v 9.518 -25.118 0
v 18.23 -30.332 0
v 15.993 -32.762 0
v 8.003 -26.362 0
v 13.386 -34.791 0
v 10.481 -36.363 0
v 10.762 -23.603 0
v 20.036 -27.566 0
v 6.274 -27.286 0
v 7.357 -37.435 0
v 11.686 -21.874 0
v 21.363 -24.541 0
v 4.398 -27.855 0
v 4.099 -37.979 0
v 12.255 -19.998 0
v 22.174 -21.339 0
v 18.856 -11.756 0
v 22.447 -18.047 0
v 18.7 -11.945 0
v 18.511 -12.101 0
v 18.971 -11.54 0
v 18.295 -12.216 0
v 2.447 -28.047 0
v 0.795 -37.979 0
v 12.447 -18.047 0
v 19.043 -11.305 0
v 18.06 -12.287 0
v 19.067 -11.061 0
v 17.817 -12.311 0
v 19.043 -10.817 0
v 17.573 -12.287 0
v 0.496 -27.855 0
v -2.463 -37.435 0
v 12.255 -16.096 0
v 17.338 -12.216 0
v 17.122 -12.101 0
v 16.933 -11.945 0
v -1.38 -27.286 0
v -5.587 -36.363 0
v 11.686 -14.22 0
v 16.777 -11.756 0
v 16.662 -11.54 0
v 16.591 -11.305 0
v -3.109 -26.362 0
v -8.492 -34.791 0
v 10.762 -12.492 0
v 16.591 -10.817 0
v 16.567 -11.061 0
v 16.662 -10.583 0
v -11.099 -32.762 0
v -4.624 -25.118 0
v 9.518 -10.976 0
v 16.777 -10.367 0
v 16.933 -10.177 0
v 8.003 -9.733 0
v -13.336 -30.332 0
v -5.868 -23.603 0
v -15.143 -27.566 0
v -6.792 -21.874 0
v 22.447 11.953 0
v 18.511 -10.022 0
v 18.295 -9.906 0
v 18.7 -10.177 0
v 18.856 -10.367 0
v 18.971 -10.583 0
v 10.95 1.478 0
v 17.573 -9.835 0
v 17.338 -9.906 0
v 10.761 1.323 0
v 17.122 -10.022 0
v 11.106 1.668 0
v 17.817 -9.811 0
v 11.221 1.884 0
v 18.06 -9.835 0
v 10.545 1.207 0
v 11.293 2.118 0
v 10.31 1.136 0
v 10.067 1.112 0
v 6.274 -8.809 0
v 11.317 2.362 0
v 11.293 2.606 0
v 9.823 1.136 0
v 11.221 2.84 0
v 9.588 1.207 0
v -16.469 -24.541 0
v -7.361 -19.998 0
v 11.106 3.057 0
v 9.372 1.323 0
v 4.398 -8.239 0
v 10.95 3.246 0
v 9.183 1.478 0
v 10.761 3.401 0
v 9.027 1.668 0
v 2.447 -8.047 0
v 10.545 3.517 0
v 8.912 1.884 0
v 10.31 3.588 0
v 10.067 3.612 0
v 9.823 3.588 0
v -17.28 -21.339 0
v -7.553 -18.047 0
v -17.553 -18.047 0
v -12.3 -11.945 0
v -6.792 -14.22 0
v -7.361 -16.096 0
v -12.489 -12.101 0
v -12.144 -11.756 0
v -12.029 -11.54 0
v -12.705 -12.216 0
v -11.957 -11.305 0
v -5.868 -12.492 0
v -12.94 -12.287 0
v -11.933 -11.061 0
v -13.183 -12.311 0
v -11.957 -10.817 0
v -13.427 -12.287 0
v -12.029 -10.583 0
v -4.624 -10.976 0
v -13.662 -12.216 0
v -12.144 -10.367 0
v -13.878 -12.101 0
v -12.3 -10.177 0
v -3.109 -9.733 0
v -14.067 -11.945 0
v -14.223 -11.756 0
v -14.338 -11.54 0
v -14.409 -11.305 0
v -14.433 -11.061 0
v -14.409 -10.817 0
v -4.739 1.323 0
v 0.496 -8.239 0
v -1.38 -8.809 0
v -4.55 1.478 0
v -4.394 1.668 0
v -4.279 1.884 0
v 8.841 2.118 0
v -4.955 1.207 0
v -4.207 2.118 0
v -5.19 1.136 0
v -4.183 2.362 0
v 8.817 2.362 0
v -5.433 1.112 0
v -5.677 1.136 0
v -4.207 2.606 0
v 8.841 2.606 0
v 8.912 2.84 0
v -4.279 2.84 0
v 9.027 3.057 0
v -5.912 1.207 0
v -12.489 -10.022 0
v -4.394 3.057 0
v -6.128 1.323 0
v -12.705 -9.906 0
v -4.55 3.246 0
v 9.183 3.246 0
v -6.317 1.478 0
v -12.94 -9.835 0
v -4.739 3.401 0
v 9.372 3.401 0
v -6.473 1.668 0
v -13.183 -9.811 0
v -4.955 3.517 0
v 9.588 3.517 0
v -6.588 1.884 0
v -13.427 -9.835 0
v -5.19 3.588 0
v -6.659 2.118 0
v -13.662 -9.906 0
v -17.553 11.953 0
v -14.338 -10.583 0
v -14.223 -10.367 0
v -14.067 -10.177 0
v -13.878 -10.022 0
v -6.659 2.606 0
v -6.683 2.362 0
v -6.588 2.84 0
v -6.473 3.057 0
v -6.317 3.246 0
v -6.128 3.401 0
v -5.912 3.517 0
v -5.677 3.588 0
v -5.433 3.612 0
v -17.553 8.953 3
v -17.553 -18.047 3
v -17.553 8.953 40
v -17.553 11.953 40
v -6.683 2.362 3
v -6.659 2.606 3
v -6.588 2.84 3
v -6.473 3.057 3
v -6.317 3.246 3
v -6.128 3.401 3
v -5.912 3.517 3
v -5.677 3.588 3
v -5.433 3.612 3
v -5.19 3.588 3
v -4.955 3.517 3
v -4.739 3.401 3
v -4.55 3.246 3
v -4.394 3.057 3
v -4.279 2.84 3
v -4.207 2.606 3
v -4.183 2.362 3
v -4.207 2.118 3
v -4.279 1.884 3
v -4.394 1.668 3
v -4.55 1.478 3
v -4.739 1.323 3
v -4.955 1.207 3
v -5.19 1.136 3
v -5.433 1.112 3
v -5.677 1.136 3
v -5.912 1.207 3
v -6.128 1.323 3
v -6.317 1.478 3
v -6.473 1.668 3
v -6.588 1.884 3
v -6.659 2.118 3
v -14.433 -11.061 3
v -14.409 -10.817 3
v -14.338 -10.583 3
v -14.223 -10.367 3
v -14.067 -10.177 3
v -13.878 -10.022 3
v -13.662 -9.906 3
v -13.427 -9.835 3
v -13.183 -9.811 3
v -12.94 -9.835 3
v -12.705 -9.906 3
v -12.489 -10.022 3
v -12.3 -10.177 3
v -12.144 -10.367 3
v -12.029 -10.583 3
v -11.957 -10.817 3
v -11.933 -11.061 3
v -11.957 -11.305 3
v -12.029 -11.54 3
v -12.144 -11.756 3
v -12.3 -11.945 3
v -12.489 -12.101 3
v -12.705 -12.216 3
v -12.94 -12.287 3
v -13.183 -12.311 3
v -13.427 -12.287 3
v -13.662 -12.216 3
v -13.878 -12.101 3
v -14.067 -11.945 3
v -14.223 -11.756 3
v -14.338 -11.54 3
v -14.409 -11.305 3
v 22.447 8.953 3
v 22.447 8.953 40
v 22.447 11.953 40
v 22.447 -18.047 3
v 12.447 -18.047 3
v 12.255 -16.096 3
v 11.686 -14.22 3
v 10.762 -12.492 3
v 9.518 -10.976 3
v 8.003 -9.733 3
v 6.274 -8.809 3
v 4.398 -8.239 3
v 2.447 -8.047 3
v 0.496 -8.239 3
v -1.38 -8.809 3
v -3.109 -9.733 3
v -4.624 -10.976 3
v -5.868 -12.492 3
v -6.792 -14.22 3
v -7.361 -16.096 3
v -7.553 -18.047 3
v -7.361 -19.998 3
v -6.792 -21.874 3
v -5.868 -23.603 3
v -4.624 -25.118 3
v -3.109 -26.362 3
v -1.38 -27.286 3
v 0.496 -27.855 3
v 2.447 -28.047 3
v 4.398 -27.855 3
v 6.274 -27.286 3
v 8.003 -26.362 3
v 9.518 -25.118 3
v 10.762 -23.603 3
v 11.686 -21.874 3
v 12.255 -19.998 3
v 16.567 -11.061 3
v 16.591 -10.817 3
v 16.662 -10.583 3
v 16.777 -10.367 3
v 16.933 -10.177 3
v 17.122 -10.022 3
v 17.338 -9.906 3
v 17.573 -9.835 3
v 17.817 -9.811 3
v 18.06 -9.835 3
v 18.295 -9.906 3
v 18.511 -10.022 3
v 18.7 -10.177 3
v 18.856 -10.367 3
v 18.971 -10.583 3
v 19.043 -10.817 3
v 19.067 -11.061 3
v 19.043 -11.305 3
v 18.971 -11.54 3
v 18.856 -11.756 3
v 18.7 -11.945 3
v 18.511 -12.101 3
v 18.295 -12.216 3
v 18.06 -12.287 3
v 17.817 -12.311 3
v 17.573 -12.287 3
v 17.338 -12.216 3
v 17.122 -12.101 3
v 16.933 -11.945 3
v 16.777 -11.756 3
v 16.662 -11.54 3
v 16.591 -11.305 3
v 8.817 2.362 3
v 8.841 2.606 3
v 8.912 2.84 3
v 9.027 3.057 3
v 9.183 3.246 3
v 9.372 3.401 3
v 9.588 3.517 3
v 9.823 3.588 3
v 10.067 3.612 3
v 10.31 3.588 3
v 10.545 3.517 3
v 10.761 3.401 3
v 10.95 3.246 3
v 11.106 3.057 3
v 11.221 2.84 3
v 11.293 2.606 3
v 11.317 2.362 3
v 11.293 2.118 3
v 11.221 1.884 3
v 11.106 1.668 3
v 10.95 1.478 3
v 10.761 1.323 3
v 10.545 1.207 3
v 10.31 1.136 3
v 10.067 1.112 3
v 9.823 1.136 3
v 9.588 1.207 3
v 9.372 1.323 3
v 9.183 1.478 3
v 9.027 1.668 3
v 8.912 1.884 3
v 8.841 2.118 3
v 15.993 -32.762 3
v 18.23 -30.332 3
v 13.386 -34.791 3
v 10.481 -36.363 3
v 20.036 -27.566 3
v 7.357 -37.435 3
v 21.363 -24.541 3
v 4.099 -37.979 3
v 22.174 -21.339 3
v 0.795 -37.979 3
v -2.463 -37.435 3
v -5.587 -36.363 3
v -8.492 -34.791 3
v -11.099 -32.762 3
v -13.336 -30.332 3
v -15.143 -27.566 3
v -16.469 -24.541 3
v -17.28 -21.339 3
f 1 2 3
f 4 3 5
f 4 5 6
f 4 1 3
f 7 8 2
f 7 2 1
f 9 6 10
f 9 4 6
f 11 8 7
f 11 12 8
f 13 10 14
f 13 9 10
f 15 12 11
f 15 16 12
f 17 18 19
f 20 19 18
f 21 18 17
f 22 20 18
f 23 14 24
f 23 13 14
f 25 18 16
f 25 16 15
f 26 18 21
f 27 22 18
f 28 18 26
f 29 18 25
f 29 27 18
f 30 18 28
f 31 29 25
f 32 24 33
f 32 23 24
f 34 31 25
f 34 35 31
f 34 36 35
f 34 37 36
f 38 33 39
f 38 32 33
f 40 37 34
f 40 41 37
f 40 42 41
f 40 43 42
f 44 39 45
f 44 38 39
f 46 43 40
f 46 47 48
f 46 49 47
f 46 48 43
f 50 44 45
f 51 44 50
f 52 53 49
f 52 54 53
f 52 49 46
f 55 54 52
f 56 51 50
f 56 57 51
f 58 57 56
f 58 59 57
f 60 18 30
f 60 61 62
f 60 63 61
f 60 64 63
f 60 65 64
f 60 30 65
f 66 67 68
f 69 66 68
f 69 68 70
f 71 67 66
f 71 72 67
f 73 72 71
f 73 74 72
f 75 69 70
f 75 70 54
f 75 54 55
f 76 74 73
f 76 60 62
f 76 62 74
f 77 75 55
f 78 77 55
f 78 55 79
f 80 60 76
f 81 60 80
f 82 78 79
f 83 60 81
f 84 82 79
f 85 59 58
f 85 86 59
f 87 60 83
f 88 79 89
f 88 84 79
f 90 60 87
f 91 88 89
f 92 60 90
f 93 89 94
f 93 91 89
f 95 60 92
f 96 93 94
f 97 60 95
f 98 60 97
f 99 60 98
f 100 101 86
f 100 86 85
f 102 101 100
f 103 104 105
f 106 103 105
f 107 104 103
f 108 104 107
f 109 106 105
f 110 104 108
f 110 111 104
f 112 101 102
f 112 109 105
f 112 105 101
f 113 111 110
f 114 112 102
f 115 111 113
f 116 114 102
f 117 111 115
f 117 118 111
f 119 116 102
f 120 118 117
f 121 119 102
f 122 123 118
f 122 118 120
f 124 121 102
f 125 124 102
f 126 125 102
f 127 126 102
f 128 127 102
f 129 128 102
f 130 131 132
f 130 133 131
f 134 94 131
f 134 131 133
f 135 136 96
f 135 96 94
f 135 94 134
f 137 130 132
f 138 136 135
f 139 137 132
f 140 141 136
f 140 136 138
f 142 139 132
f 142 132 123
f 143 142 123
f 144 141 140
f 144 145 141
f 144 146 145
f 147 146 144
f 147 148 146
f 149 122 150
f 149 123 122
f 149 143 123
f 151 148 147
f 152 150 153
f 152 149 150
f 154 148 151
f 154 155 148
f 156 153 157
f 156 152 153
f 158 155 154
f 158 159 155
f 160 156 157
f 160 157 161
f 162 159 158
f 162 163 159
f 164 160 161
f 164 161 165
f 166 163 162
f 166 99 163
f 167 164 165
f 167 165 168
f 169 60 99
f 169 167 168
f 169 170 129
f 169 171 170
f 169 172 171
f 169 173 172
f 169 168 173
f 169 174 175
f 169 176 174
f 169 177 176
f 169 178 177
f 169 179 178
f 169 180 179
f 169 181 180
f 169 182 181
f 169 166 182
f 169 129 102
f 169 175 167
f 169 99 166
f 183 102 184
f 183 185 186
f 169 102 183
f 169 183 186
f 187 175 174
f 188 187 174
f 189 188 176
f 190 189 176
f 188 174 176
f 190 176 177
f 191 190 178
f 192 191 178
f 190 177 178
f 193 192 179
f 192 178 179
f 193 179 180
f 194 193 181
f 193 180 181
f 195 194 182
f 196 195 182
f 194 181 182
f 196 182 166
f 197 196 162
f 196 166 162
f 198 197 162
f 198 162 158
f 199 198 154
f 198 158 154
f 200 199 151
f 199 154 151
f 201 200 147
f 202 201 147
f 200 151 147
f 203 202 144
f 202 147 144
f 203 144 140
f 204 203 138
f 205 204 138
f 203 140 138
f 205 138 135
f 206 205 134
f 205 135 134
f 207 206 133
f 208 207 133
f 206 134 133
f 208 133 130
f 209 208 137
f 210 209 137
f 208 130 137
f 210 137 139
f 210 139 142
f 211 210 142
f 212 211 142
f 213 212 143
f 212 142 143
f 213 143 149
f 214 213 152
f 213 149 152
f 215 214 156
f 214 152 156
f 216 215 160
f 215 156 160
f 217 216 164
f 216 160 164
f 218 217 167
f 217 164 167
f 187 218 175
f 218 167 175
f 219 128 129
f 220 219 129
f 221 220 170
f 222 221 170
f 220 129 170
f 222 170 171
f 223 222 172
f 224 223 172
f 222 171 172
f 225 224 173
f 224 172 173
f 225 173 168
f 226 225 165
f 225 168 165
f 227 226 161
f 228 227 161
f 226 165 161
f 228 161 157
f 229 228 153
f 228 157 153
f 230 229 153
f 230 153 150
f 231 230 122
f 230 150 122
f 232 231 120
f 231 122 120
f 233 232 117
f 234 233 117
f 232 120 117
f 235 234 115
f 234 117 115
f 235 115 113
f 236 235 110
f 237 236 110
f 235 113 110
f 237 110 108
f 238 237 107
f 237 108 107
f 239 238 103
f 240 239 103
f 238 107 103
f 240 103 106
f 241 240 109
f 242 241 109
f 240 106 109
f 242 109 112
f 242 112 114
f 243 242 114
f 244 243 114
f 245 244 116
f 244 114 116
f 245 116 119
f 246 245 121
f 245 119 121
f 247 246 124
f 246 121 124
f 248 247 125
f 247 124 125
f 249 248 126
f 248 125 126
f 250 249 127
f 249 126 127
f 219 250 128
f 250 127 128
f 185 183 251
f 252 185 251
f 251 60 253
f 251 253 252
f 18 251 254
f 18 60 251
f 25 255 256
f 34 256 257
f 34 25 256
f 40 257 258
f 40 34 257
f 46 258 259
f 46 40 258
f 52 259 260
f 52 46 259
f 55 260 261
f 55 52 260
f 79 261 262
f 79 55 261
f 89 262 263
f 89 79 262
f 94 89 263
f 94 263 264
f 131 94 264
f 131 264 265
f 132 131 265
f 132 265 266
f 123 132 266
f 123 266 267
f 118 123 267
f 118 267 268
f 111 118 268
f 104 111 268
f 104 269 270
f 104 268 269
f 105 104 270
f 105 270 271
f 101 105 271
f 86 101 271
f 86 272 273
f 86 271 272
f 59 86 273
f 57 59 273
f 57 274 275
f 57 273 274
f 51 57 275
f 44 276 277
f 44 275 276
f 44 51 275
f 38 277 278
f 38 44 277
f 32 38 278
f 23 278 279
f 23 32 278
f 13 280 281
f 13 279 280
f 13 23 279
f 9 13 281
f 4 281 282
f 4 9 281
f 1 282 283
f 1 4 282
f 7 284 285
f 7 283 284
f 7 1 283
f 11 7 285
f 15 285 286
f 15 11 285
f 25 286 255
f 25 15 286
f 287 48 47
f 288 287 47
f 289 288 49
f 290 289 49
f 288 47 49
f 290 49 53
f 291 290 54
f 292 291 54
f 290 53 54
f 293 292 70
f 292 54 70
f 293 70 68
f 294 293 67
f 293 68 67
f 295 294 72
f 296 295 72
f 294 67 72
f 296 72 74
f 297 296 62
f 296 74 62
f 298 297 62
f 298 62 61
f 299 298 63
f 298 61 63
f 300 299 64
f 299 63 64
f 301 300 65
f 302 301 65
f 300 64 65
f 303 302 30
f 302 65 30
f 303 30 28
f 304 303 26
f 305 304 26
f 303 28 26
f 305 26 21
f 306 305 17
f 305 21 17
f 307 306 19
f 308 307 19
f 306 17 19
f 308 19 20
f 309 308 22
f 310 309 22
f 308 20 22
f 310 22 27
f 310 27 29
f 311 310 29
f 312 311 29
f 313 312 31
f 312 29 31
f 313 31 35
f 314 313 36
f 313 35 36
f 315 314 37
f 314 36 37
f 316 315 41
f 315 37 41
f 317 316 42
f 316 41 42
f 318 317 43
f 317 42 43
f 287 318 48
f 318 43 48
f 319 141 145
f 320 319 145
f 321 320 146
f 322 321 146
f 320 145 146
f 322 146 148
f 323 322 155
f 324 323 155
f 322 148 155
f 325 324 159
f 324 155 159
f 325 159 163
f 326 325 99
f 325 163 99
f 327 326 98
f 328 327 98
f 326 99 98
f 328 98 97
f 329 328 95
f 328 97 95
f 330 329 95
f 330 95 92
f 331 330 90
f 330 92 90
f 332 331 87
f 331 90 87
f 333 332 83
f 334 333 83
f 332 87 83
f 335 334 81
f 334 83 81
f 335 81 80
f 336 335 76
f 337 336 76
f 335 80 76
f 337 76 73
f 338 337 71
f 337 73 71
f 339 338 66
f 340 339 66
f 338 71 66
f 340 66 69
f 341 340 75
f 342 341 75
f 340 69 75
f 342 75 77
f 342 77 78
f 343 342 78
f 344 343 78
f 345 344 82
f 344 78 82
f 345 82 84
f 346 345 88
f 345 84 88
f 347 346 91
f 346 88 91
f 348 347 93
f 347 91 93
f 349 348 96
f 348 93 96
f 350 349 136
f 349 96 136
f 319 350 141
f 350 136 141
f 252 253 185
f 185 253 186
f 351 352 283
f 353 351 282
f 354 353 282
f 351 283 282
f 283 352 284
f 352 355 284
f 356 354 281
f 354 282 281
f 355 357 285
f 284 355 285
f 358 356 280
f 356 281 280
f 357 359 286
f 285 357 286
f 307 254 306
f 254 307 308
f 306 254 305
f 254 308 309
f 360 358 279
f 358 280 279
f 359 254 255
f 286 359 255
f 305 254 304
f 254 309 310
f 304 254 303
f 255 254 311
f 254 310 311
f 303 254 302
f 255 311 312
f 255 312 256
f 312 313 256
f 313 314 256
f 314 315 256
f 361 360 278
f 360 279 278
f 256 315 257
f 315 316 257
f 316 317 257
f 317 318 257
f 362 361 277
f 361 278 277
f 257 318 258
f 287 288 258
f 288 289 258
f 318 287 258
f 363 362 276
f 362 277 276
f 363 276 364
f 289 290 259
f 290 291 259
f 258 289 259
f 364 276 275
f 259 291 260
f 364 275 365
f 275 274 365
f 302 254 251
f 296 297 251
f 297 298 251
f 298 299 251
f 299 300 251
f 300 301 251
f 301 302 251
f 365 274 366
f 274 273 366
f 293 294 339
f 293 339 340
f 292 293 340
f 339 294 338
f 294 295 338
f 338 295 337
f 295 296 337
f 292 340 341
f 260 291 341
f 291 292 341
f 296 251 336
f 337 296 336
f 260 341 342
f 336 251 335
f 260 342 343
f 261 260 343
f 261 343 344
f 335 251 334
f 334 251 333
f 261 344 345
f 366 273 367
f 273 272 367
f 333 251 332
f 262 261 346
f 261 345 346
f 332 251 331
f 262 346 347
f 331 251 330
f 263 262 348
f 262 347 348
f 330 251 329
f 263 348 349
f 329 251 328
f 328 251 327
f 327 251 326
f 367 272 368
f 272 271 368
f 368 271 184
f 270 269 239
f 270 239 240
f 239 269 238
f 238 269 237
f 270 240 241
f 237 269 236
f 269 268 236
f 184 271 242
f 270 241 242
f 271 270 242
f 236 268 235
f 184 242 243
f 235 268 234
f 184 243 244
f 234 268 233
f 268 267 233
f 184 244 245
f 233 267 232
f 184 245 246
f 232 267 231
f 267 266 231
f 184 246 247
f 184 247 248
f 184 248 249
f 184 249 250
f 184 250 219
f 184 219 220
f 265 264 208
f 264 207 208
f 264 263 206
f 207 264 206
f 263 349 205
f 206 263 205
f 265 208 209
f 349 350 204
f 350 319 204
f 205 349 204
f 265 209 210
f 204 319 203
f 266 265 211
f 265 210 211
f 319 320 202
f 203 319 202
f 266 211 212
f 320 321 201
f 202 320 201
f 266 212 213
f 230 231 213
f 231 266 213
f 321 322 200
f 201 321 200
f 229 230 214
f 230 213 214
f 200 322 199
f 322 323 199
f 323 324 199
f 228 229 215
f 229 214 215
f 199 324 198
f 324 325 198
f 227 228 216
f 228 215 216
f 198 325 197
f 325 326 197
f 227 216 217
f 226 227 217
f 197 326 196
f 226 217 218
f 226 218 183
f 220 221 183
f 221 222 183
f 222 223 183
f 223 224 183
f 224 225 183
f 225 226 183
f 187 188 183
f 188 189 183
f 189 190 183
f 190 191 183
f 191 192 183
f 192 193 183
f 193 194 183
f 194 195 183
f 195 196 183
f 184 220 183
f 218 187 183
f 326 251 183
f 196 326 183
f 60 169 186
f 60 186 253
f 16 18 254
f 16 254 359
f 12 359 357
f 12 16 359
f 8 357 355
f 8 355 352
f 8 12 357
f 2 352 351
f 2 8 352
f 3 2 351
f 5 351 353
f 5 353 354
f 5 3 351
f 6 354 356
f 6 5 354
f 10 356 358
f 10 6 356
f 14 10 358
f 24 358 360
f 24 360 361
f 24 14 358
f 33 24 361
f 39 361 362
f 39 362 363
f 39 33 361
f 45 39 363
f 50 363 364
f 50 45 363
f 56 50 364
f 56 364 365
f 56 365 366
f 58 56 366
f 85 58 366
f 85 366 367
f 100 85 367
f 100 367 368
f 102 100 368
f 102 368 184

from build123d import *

# Parameters (mm, degrees)
SKETCH_1_R          = 10
EXTRUDE_2_DEPTH     = 40
CUT_EXTRUDE_START   = -37
CUT_EXTRUDE_1_DEPTH = 37
SKETCH_5_R          = 1.25
CUT_EXTRUDE_4_DEPTH = 3
SKETCH_6_R          = 1.25
CUT_EXTRUDE_5_DEPTH = 3
SKETCH_7_R          = 1.25
CUT_EXTRUDE_6_DEPTH = 3
SKETCH_8_R          = 1.25
CUT_EXTRUDE_7_DEPTH = 3


with BuildPart() as part:
    # 草图1 → 凸台-拉伸2 (new body)
    with BuildSketch(Plane.XY):
        with BuildLine():
            Line((-17.553025885, 11.952701951), (22.446974115, 11.952701951))
            Line((22.446974115, 11.952701951), (22.446974115, -18.047298049))
            ThreePointArc((22.446974115, -18.047298049), (2.446974115, -38.047298049), (-17.553025885, -18.047298049))
            Line((-17.553025885, -18.047298049), (-17.553025885, 11.952701951))
        make_face()
        with Locations((2.446974115, -18.047298049)):
            Circle(SKETCH_1_R, mode=Mode.SUBTRACT)
    extrude(amount=EXTRUDE_2_DEPTH)

    # 草图2 → 切除-拉伸1 (cut)
    with BuildSketch(Plane.XY.offset(40).offset(CUT_EXTRUDE_START)):
        with BuildLine():
            Line((-17.553025885, -18.047298049), (-17.553025885, 8.952701951))
            Line((-17.553025885, 8.952701951), (22.446974115, 8.952701951))
            Line((22.446974115, 8.952701951), (22.446974115, -18.047298049))
            ThreePointArc((22.446974115, -18.047298049), (2.446974115, -38.047298049), (-17.553025885, -18.047298049))
        make_face()
    extrude(amount=CUT_EXTRUDE_1_DEPTH, mode=Mode.SUBTRACT)

    # 草图5 → 切除-拉伸4 (cut)
    with BuildSketch(Plane(origin=(0, 0, 0), x_dir=(-1, 0, 0), z_dir=(0, 0, -1))):
        with Locations((-10.066616202, 2.362067463)):
            Circle(SKETCH_5_R)
    extrude(amount=-CUT_EXTRUDE_4_DEPTH, mode=Mode.SUBTRACT)

    # 草图6 → 切除-拉伸5 (cut)
    with BuildSketch(Plane(origin=(0, 0, 0), x_dir=(-1, 0, 0), z_dir=(0, 0, -1))):
        with Locations((5.433383798, 2.362067463)):
            Circle(SKETCH_6_R)
    extrude(amount=-CUT_EXTRUDE_5_DEPTH, mode=Mode.SUBTRACT)

    # 草图7 → 切除-拉伸6 (cut)
    with BuildSketch(Plane(origin=(0, 0, 0), x_dir=(-1, 0, 0), z_dir=(0, 0, -1))):
        with Locations((-17.816616202, -11.061326295)):
            Circle(SKETCH_7_R)
    extrude(amount=-CUT_EXTRUDE_6_DEPTH, mode=Mode.SUBTRACT)

    # 草图8 → 切除-拉伸7 (cut)
    with BuildSketch(Plane(origin=(0, 0, 0), x_dir=(-1, 0, 0), z_dir=(0, 0, -1))):
        with Locations((13.183383798, -11.061326295)):
            Circle(SKETCH_8_R)
    extrude(amount=-CUT_EXTRUDE_7_DEPTH, mode=Mode.SUBTRACT)


solid = part.part
